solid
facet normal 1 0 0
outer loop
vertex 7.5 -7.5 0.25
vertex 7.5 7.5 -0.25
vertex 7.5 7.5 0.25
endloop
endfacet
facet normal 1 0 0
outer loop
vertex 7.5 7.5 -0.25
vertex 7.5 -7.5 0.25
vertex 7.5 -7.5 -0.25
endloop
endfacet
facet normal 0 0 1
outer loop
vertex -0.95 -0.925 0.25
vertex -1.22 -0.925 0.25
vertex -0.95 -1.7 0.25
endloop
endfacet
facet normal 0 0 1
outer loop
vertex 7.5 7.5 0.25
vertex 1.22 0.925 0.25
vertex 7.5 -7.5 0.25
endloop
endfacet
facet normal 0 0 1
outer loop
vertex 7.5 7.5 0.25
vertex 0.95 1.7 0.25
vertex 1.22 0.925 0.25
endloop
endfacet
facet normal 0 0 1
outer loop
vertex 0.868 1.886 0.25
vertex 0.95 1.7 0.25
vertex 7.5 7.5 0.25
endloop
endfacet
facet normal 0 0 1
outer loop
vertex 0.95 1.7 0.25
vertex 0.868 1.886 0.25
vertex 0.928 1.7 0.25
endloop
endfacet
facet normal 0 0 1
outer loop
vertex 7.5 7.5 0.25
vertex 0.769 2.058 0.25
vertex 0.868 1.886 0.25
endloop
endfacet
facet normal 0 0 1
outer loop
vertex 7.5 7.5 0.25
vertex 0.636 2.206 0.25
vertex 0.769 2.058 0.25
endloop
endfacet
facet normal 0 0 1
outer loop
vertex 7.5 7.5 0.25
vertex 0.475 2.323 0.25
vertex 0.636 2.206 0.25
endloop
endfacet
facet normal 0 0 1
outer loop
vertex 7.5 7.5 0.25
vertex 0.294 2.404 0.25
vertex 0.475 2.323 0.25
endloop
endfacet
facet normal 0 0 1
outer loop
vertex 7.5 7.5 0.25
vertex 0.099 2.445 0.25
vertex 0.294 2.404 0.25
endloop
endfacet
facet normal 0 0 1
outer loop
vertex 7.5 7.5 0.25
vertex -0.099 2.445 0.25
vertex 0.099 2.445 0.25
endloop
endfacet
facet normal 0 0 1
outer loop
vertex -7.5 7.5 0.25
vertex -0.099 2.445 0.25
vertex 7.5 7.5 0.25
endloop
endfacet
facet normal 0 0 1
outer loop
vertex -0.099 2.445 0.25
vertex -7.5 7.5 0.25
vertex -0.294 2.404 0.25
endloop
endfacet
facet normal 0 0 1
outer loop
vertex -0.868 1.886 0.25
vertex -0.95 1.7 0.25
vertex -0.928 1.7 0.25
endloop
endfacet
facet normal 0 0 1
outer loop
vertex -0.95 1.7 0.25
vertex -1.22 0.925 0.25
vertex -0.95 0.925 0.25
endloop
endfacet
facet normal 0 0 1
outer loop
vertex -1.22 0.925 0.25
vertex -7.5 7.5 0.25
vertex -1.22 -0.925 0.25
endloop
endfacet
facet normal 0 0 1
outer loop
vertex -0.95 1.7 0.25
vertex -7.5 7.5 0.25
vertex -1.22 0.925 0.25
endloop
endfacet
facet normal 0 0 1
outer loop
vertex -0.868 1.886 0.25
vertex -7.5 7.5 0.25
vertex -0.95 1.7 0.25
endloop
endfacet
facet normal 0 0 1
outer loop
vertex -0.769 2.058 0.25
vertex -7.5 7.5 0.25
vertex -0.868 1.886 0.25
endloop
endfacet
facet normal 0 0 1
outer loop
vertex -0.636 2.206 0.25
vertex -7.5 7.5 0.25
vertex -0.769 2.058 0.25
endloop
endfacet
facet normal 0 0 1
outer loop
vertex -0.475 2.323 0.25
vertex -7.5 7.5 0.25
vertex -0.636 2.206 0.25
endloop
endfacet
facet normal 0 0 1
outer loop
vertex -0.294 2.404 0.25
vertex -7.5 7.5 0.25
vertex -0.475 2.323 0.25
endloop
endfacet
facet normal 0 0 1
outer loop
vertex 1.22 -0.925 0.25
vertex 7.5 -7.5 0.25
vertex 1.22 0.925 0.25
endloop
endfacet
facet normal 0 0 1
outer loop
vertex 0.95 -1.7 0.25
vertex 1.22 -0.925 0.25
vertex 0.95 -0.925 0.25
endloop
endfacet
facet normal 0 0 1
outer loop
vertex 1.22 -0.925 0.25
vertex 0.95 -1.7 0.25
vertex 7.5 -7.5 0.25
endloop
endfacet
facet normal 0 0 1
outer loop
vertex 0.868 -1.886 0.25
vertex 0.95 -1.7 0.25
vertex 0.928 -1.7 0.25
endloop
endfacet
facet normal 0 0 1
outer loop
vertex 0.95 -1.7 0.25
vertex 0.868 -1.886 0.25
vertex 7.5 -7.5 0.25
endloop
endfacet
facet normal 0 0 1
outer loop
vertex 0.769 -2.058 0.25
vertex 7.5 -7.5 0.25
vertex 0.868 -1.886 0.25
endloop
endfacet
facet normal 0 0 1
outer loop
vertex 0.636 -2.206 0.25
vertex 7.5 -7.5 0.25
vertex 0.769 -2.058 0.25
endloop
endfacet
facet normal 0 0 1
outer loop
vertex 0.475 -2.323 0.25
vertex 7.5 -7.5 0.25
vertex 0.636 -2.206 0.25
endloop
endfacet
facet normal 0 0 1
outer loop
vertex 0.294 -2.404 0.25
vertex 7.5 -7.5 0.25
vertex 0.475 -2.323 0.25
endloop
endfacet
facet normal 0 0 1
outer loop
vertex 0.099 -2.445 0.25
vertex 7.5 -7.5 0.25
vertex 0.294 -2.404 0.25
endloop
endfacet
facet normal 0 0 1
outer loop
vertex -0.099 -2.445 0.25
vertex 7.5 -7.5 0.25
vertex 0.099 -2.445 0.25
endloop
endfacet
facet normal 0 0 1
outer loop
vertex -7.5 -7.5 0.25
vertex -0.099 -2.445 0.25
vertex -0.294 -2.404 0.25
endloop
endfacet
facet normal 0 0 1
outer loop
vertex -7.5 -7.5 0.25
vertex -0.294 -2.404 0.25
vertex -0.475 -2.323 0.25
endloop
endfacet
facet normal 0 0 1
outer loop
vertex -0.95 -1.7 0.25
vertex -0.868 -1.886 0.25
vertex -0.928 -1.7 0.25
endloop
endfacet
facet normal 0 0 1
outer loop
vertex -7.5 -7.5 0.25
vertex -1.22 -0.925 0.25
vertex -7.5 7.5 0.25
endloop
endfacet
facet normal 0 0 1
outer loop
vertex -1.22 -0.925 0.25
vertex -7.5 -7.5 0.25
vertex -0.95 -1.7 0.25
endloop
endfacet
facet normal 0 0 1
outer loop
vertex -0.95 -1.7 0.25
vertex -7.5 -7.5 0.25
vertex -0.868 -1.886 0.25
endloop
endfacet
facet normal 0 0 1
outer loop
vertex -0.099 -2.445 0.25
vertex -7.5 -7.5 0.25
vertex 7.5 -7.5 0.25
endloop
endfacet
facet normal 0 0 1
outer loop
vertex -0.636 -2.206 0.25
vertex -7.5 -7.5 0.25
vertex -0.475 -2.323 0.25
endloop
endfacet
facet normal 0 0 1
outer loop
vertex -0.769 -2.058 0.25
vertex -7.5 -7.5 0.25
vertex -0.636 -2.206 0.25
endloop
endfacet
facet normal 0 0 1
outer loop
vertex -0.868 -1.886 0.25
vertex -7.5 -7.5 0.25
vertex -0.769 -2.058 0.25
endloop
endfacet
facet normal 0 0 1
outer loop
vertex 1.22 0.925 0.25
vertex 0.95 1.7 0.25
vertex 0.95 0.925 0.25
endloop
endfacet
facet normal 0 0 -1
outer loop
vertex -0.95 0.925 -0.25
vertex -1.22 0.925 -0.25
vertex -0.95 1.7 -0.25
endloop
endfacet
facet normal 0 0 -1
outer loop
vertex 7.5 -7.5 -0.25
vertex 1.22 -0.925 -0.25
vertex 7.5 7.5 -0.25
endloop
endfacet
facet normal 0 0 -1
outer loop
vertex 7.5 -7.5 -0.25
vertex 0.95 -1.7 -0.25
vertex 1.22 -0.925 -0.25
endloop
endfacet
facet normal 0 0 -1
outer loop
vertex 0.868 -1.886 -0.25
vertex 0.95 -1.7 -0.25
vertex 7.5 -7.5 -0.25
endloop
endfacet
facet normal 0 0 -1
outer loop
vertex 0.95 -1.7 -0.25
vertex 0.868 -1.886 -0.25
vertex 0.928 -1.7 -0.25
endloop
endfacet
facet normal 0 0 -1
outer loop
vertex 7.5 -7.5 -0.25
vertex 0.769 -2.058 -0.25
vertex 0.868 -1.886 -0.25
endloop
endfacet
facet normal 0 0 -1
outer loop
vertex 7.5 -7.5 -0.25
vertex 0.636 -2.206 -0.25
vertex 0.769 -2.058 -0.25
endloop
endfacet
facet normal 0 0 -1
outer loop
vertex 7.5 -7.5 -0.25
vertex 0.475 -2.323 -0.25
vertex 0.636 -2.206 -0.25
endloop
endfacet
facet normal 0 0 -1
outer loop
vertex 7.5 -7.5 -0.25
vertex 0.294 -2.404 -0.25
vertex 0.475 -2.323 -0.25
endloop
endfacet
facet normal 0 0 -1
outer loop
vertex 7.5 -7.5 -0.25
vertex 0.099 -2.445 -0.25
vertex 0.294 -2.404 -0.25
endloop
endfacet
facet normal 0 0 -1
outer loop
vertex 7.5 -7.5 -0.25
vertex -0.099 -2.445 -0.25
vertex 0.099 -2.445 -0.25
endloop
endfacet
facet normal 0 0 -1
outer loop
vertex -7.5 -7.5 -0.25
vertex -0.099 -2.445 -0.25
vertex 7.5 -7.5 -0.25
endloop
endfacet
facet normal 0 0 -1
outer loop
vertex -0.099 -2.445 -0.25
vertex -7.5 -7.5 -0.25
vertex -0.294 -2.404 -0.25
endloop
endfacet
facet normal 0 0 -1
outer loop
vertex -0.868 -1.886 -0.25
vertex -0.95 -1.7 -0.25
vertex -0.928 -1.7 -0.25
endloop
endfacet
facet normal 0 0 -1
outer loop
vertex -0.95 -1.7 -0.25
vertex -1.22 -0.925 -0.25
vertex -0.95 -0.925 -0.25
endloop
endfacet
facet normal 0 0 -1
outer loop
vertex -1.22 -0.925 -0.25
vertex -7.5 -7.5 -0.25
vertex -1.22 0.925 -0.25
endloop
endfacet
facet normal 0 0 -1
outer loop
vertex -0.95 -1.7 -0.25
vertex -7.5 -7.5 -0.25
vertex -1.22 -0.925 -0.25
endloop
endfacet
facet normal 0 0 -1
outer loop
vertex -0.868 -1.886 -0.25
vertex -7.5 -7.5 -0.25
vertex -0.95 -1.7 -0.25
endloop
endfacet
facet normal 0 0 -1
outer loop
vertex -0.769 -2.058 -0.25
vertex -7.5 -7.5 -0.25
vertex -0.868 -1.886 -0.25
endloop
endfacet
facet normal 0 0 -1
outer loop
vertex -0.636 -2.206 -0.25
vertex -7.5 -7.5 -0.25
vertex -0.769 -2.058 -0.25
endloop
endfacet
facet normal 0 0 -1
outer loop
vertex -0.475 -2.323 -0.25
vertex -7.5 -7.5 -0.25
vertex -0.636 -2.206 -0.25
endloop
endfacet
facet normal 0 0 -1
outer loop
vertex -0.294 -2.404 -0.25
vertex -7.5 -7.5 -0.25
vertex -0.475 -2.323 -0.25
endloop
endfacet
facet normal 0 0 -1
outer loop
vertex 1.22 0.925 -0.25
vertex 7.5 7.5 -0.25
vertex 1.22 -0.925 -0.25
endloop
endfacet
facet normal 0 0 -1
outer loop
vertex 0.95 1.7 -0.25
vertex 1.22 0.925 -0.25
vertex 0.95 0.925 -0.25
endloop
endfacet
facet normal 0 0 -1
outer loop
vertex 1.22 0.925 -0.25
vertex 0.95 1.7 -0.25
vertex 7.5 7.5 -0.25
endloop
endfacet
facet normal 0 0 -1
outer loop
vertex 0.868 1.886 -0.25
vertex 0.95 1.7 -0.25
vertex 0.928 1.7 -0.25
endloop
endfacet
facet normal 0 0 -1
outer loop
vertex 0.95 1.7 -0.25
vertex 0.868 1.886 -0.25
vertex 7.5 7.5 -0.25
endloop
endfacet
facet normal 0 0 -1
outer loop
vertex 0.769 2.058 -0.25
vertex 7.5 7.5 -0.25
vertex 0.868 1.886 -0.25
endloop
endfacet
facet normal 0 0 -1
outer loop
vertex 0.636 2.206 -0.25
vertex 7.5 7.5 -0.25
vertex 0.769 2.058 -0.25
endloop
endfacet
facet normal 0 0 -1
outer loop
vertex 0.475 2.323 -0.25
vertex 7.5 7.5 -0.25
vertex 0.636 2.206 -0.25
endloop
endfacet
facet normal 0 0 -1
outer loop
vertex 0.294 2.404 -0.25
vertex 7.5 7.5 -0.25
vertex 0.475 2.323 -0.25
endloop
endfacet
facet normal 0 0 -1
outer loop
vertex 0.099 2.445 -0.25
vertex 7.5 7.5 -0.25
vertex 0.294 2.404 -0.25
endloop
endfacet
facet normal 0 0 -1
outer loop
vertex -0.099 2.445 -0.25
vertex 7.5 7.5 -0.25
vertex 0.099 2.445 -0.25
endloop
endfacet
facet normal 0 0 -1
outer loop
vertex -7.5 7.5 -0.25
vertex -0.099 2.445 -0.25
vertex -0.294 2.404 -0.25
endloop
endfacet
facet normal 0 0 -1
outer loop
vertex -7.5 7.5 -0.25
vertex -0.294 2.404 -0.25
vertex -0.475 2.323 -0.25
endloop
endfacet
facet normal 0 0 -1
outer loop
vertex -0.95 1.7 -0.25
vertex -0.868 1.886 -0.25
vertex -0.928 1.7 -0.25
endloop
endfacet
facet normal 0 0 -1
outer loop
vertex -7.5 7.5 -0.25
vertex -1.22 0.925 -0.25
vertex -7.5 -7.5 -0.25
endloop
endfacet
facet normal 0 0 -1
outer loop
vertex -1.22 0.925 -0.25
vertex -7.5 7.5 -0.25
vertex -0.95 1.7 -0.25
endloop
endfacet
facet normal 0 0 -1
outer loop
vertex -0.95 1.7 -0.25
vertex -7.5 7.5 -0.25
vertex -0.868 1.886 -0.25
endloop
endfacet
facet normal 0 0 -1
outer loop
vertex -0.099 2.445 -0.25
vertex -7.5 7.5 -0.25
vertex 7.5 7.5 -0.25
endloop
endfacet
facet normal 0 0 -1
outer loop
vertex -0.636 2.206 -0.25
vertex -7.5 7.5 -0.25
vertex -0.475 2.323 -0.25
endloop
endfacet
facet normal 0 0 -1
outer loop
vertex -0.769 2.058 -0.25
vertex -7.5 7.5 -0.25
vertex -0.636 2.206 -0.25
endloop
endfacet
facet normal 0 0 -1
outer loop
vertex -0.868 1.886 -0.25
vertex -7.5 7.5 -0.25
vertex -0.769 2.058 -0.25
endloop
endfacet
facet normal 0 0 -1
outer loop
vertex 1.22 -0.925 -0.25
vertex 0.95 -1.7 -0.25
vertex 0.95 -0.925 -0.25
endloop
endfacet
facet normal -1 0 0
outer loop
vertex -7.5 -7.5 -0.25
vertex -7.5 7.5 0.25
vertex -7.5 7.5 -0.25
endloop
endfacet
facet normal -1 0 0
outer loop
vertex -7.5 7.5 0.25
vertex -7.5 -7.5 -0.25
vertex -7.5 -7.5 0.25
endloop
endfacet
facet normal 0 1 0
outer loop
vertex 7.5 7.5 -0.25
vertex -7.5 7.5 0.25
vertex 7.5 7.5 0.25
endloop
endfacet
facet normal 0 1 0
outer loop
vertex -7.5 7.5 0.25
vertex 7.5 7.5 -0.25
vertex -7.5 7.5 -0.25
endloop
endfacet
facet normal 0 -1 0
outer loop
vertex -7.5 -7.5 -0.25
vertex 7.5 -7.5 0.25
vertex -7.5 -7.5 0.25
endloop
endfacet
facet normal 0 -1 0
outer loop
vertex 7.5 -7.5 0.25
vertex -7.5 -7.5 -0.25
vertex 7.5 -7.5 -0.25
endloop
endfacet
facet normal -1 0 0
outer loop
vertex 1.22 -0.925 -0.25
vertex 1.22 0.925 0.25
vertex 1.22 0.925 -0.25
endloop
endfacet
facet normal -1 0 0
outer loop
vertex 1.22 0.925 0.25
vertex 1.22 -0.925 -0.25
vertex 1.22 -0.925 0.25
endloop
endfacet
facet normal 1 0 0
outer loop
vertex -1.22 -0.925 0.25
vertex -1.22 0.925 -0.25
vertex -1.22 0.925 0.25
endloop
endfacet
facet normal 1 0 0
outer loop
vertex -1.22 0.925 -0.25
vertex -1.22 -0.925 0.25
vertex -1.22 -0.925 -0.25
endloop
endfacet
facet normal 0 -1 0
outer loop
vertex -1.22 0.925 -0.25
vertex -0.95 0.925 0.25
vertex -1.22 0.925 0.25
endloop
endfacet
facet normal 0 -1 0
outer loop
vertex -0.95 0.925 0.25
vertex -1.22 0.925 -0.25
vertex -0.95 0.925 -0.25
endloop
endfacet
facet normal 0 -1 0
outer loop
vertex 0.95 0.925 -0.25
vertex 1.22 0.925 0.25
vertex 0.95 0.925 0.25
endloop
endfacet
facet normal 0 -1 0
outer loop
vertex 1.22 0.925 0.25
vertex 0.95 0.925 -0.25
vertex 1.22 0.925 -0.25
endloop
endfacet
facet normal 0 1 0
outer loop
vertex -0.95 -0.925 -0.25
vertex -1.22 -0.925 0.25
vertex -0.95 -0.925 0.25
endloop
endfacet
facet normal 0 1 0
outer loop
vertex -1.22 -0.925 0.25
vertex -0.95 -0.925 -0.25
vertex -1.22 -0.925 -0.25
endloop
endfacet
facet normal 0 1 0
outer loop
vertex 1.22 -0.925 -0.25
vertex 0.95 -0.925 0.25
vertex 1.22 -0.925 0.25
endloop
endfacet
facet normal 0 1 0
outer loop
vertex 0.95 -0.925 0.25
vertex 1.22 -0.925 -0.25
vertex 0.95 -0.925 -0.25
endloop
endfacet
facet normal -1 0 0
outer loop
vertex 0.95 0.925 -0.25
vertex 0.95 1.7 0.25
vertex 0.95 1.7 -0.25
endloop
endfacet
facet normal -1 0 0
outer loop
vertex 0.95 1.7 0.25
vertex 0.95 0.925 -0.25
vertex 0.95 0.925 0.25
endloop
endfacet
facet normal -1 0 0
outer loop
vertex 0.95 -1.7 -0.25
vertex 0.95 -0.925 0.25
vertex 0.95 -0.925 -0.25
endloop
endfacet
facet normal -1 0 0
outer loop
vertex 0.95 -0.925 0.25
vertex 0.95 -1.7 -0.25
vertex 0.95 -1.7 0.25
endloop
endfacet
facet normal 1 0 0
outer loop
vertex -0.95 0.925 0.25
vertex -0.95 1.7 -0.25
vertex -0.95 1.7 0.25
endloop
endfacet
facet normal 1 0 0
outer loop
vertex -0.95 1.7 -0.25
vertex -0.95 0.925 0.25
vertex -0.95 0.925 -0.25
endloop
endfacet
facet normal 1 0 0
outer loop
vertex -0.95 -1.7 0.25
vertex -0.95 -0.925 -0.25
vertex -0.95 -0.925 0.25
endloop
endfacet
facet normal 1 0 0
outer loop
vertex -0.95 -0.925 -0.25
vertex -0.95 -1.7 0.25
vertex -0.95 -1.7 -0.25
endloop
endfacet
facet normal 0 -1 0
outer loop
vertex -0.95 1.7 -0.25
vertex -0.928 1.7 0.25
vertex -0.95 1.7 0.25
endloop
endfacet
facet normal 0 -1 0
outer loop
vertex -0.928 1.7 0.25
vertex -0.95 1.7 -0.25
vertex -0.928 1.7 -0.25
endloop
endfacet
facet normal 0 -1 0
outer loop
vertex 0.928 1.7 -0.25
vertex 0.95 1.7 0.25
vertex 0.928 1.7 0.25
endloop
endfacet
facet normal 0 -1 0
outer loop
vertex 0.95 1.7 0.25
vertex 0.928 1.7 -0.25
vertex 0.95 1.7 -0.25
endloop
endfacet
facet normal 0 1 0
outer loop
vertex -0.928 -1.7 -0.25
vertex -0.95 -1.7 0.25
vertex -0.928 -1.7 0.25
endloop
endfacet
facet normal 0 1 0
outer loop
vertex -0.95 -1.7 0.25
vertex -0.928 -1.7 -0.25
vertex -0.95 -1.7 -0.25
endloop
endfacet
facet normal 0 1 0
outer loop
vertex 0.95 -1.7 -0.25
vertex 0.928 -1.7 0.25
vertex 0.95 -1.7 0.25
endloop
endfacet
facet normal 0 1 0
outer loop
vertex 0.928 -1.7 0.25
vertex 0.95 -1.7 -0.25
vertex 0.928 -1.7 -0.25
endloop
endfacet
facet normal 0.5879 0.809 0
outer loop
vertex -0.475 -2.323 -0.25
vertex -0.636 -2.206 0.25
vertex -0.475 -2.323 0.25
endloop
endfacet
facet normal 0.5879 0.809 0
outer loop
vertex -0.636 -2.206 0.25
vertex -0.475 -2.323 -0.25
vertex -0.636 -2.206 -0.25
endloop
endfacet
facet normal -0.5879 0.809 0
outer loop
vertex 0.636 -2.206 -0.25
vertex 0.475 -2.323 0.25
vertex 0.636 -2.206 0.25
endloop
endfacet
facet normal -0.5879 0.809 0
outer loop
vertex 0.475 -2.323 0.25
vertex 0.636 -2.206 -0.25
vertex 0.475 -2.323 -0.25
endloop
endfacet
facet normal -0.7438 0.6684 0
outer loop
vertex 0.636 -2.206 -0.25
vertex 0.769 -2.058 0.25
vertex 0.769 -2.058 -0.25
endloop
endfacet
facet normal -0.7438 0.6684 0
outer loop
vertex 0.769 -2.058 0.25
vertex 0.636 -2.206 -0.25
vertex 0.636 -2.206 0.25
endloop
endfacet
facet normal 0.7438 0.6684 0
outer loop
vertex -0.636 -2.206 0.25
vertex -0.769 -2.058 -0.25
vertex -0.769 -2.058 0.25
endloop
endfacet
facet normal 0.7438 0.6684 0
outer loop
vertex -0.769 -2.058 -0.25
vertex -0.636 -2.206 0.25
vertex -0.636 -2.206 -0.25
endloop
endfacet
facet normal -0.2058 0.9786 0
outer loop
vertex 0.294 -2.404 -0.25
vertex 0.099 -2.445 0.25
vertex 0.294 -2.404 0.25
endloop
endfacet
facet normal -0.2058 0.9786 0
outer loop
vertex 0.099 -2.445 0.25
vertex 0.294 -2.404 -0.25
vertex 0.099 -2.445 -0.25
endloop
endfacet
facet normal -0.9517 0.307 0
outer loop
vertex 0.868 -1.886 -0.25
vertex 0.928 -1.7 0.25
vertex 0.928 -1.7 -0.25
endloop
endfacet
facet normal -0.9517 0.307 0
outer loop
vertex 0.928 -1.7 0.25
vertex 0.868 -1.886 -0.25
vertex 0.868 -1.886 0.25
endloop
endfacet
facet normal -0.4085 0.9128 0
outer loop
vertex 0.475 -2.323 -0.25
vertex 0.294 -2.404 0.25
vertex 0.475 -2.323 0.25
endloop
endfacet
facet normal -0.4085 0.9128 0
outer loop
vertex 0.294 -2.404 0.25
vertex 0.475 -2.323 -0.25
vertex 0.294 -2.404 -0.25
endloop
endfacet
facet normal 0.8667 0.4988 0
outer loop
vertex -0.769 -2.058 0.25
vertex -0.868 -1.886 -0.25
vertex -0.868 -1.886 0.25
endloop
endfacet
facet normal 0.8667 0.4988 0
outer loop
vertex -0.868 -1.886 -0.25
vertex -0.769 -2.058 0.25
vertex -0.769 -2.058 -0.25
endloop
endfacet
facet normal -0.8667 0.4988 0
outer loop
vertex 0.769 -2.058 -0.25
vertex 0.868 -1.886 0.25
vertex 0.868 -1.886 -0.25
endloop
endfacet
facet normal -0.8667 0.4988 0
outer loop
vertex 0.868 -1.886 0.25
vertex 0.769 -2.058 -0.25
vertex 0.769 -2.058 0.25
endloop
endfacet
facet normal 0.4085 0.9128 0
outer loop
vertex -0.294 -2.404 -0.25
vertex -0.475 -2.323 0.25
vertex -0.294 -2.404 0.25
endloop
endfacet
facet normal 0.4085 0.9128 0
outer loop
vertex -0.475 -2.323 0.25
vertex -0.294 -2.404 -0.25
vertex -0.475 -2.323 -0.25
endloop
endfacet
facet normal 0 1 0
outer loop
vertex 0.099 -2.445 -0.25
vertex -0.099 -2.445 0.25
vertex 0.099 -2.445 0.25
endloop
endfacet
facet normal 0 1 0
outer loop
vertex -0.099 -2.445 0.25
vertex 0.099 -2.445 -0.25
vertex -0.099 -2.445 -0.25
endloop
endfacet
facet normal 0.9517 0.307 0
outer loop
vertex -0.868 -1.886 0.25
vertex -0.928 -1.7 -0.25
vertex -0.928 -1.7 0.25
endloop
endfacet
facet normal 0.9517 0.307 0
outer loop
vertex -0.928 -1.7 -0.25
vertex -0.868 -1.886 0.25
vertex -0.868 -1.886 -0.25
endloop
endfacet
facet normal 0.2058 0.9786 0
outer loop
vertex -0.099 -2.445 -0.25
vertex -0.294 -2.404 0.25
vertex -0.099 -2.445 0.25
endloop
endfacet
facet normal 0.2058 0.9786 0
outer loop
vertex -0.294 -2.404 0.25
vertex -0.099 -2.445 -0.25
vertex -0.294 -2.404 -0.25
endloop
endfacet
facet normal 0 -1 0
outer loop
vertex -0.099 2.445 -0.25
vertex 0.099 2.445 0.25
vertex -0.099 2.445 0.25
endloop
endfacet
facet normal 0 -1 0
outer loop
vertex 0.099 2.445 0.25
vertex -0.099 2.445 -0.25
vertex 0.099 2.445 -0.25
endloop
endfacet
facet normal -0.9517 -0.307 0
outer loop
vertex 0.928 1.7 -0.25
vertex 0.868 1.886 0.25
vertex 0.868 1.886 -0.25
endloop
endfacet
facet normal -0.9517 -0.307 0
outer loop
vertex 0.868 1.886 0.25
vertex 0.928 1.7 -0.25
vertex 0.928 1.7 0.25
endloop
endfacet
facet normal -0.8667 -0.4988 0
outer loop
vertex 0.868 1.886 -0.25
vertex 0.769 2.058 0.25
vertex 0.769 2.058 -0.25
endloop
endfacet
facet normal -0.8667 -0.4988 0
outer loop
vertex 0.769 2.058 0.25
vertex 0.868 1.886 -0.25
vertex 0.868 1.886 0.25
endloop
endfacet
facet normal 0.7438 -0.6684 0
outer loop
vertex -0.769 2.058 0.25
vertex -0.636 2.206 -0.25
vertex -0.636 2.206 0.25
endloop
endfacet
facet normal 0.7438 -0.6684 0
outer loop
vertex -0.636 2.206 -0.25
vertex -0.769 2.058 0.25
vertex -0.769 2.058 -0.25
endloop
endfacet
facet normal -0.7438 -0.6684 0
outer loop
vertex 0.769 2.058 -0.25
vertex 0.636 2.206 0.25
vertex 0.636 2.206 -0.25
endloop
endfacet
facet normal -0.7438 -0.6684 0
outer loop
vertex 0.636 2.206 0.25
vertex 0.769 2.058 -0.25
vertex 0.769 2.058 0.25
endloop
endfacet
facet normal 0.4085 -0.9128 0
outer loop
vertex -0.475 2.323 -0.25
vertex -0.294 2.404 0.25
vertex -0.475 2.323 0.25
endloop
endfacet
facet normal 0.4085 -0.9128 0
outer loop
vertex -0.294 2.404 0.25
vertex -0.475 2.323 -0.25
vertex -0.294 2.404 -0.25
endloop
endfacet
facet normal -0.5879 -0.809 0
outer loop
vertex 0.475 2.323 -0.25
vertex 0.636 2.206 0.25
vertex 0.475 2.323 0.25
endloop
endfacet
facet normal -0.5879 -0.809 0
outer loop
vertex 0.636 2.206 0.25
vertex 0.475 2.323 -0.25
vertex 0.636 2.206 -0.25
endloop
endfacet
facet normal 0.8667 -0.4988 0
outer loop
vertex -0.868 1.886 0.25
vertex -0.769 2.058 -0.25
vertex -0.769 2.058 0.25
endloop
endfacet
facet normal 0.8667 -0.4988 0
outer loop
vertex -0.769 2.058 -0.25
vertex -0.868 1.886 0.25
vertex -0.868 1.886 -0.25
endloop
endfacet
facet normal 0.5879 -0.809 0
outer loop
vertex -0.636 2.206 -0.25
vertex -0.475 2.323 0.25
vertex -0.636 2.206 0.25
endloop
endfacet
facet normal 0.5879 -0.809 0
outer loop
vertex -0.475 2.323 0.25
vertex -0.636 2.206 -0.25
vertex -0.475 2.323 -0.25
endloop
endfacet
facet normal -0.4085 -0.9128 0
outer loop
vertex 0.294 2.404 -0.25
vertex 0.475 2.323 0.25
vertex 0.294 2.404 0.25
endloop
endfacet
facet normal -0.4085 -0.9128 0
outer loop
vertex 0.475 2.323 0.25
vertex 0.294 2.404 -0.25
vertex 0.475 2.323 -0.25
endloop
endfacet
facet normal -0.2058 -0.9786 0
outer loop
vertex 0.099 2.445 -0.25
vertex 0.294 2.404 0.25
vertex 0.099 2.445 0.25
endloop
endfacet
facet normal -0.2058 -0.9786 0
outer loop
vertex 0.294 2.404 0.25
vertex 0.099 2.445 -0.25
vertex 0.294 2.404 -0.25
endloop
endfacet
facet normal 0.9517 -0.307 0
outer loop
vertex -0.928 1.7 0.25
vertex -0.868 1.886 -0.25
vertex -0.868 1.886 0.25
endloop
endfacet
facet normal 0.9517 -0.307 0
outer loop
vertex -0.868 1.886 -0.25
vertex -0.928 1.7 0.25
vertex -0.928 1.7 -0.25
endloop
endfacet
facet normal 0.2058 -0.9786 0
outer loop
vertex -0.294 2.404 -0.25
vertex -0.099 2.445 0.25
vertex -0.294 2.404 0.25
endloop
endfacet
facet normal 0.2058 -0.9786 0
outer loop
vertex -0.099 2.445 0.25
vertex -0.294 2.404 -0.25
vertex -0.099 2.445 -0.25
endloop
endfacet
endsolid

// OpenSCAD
$fs = 0.1;

difference() {
    cube([15, 15, 0.5], center=true);
    cube([2.44, 1.85,1], center=true);
    cube([1.9, 3.4,1], center=true);
    translate([0, -1.5, -2]){
        cylinder(5, 0.95, 0.95);
    }
    translate([0, 1.5, -2]){
        cylinder(5, 0.95, 0.95);
    }
}
